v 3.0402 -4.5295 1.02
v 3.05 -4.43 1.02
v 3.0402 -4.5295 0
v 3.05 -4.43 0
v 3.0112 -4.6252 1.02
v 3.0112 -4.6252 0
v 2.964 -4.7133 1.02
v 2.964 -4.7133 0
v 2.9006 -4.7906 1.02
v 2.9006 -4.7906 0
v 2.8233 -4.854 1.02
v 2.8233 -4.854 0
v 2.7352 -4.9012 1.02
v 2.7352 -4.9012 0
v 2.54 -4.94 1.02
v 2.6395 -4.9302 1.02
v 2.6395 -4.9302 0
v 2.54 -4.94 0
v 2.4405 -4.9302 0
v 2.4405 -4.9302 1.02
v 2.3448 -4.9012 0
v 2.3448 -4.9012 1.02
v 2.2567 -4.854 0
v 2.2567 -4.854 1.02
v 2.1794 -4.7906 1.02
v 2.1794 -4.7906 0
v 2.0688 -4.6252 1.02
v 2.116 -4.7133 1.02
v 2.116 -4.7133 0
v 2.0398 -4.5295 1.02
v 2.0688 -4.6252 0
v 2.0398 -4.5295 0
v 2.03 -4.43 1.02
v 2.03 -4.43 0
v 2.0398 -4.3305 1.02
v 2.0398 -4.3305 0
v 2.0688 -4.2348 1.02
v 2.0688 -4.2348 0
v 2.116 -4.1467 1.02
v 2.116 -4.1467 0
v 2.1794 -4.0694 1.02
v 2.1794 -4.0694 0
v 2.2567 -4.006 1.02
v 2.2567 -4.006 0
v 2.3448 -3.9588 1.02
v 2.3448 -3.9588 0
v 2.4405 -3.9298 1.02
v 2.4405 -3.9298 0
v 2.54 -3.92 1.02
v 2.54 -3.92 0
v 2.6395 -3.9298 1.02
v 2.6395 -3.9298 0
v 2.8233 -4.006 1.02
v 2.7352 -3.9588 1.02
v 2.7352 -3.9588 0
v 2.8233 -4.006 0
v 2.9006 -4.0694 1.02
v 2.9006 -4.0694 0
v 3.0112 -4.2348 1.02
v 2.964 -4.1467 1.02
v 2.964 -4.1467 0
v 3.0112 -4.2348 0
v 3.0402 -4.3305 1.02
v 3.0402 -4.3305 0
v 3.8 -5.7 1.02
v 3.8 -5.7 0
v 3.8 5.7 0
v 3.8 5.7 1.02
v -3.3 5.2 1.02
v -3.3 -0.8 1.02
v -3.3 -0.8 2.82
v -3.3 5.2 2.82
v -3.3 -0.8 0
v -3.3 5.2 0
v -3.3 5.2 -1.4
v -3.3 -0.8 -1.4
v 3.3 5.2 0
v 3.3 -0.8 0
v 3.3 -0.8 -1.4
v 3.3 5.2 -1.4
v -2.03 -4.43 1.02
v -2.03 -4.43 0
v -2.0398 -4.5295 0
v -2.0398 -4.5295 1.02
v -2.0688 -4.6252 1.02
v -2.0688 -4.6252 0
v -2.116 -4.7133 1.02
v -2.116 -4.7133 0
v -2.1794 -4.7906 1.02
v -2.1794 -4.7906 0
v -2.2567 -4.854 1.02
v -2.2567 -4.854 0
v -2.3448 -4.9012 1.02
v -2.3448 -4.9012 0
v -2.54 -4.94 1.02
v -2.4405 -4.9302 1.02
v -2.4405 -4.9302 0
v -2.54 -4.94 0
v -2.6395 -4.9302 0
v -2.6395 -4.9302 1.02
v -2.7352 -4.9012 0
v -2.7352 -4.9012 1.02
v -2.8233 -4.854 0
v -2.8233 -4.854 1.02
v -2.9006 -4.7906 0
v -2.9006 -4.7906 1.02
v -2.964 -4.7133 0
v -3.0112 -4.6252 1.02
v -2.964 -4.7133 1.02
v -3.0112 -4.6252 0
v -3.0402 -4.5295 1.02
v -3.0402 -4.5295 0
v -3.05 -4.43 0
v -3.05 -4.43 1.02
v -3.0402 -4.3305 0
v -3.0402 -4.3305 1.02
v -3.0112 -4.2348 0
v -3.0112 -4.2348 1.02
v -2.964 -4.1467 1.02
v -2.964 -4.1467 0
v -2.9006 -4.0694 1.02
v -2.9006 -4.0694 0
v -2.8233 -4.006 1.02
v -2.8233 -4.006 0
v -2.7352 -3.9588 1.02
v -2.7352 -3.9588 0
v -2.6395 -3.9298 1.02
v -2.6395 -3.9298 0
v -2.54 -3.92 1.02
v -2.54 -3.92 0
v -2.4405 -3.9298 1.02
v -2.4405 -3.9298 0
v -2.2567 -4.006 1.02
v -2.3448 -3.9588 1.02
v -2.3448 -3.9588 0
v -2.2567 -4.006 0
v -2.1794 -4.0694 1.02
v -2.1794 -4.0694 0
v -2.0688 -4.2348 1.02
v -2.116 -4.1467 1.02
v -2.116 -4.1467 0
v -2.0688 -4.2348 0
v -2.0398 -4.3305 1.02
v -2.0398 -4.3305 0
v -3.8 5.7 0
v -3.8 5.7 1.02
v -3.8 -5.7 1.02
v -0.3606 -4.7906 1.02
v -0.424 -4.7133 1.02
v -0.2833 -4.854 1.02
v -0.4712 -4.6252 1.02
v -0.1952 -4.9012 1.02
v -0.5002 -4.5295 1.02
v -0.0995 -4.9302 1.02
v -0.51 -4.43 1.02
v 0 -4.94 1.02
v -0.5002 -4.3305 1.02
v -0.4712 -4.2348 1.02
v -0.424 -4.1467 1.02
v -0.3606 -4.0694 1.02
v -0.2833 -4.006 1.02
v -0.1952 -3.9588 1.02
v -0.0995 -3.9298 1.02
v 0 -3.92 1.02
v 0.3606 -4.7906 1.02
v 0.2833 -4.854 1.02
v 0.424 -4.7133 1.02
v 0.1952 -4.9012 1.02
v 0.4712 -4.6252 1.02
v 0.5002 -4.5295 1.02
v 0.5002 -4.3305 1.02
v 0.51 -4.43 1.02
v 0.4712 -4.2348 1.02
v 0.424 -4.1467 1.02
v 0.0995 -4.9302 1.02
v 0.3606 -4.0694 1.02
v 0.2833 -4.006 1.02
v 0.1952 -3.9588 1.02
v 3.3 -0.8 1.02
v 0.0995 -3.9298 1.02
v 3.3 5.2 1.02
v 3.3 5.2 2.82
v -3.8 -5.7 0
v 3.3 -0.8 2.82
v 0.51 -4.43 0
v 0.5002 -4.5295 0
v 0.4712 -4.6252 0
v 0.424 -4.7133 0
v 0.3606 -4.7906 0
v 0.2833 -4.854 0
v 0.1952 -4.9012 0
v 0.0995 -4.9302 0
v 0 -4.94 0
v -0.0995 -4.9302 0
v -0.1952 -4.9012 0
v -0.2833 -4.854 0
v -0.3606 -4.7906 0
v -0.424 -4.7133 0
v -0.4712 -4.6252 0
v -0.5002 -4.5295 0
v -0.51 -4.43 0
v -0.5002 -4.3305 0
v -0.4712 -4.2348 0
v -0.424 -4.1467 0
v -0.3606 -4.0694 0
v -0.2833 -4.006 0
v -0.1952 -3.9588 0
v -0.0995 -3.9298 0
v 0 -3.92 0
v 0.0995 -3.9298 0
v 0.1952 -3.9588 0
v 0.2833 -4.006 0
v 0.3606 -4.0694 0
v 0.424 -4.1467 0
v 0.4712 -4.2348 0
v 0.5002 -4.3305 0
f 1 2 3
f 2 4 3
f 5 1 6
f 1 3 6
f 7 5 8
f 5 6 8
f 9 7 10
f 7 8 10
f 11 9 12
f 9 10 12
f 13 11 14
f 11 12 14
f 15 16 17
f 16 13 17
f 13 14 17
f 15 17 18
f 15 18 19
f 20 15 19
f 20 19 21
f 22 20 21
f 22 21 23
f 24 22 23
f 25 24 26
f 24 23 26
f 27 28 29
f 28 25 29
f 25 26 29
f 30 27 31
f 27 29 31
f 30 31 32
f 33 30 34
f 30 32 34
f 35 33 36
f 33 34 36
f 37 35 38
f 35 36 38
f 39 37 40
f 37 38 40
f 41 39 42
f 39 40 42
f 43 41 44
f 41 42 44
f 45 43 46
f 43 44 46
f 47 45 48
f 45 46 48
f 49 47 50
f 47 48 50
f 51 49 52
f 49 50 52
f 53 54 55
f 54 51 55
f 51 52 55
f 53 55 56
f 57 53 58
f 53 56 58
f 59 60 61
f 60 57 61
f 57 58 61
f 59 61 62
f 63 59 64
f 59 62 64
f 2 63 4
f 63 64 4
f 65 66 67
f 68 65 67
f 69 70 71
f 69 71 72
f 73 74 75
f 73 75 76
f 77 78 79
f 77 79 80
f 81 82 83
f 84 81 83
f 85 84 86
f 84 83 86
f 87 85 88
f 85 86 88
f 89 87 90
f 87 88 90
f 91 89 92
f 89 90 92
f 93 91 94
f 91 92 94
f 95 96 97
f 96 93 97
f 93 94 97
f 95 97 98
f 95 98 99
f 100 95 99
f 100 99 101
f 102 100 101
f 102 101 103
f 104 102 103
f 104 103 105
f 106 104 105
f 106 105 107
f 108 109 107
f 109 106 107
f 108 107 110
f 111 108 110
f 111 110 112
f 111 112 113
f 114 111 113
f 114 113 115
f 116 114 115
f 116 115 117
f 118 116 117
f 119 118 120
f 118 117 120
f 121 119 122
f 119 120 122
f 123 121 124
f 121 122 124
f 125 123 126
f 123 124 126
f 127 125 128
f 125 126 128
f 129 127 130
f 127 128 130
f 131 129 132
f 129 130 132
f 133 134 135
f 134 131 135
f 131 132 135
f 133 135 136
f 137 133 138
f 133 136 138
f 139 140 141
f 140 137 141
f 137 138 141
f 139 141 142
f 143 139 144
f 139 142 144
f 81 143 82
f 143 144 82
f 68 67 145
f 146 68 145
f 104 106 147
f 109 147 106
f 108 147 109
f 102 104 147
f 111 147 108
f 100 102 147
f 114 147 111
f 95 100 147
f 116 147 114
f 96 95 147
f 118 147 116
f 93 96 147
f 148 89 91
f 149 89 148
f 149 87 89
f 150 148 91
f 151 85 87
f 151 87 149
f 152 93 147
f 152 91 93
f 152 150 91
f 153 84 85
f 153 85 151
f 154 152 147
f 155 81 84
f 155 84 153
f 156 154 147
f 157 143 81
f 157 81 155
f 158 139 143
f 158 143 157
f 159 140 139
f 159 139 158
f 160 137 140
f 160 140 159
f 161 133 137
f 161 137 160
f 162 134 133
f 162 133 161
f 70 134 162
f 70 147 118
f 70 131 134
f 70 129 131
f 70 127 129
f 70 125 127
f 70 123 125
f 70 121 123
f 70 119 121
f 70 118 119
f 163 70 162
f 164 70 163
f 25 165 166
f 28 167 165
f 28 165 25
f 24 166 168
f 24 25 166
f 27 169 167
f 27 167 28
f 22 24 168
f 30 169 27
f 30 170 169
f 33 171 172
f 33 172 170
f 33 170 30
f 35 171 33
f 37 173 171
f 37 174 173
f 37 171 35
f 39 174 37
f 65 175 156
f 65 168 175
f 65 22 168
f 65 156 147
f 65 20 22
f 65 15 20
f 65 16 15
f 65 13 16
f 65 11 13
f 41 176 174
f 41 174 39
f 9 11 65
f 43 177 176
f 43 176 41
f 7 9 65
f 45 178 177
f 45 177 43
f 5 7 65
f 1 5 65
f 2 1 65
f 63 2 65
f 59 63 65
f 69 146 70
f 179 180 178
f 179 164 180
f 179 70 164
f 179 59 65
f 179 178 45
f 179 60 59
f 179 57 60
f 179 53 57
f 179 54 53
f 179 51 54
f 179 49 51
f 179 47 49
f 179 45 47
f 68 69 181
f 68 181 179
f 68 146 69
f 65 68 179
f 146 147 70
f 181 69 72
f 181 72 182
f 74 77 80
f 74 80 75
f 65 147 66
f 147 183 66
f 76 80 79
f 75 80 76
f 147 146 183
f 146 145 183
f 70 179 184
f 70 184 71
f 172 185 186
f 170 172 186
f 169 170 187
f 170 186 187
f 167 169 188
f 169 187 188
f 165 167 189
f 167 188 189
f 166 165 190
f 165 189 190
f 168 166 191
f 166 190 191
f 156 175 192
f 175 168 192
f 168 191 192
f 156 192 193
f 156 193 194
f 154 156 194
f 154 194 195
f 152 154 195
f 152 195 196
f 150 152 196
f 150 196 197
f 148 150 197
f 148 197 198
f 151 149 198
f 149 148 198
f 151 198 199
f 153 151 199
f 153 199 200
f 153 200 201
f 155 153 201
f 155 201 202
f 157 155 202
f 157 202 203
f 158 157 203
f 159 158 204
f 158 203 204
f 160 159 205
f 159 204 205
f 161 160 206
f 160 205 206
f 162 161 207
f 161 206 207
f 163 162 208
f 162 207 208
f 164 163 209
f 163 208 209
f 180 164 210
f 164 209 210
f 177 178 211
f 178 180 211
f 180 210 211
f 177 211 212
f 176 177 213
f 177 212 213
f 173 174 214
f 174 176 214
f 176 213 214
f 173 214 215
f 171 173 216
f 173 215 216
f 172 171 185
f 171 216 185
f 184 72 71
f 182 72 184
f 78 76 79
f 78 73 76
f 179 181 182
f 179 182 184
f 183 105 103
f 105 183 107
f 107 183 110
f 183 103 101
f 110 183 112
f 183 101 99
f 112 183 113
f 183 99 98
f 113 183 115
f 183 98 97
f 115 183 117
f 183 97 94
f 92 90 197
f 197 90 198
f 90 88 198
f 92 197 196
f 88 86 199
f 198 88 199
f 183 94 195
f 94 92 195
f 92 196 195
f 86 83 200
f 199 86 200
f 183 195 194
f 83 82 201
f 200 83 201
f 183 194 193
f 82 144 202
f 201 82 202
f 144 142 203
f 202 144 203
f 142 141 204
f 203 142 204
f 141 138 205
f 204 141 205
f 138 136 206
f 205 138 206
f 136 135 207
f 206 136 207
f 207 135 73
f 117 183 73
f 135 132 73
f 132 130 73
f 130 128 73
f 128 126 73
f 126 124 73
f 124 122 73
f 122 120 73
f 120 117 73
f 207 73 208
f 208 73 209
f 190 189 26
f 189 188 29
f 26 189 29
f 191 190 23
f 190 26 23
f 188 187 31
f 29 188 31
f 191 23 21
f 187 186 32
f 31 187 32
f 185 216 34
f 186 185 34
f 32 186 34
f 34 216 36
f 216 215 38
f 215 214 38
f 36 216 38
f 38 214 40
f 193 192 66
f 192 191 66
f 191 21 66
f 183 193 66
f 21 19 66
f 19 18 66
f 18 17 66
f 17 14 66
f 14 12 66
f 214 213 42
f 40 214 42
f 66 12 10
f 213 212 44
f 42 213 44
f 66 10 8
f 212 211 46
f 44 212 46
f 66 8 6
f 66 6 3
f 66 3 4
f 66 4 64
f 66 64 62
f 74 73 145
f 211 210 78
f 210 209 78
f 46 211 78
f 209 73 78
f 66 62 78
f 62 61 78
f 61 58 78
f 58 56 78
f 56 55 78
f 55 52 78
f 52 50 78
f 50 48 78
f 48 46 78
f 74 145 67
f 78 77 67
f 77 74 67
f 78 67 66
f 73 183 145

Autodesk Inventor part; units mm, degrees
ref_plane "YZ Plane" through (0, 0, 0) normal (1, 0, 0) x (0, 1, 0)
ref_plane "XZ Plane" through (0, 0, 0) normal (0, 1, 0) x (-1, 0, 0)
ref_plane "XY Plane" through (0, 0, 0) normal (0, 0, 1) x (1, 0, 0)
sketch "スケッチ1" plane through (0, 0, 0) normal (0, 0, 1) x (1, 0, 0)
  line L0 (-3.8, -5.7) -> (3.8, -5.7)
  line L1 (3.8, -5.7) -> (3.8, 5.7)
  line L2 (3.8, 5.7) -> (-3.8, 5.7)
  line L3 (-3.8, 5.7) -> (-3.8, -5.7)
  line L4 (-3.8, -5.7) -> (3.8, 5.7) construction
  line L5 (3.8, -5.7) -> (-3.8, 5.7) construction
  circle A0 centre (0, -4.43) radius 0.51
  circle A1 centre (-2.54, -4.43) radius 0.51
  circle A2 centre (2.54, -4.43) radius 0.51
  point P0 (0, 0)
  point P1 (0, 0)
  dimension "d0" = 11.4
  dimension "d1" = 7.6
  dimension "d2" = 1.27
  dimension "d3" = 2.54
  dimension "d4" = 2.54
  dimension "d5" = 1.02
extrude "押し出し1" add sketch "スケッチ1" along normal blind 1.02
sketch "スケッチ2" plane through (0, 0, 1.02) normal (0, 0, 1) x (1, 0, 0)
  line L0 (-3.3, 5.2) -> (3.3, 5.2)
  line L1 (3.3, 5.2) -> (3.3, -0.8)
  line L2 (3.3, -0.8) -> (-3.3, -0.8)
  line L3 (-3.3, -0.8) -> (-3.3, 5.2)
  line L4 (-3.3, 5.2) -> (3.3, -0.8) construction
  line L5 (3.3, 5.2) -> (-3.3, -0.8) construction
  line L6 (3.8, 5.7) -> (-3.8, 5.7) projected
  line L7 (-3.8, 5.7) -> (-3.8, -5.7) projected
  line L8 (3.8, -5.7) -> (3.8, 5.7) projected
  point P0 (0, 0)
  point P1 (0, 2.2)
  dimension "d8" = 0.5
  dimension "d9" = 0.5
  dimension "d10" = 0.5
  dimension "d11" = 6
extrude "押し出し2" add sketch "スケッチ2" along normal blind 1.8
sketch "スケッチ3" plane through (0, 0, 0) normal (0, 0, -1) x (-1, 0, 0)
  line L0 (-3.3, 5.2) -> (3.3, 5.2) projected
  line L1 (3.3, 5.2) -> (3.3, -0.8) projected
  line L2 (3.3, -0.8) -> (-3.3, -0.8) projected
  line L3 (-3.3, -0.8) -> (-3.3, 5.2) projected
  point P0 (0, 0)
extrude "押し出し3" add sketch "スケッチ3" along normal blind 1.4
sketch "スケッチ4" plane through (0, 0, 1.02) normal (0, 0, 1) x (1, 0, 0)
  line L0 (-3.0991, -3.2712) -> (-1.8939, -3.2712) construction
  line L1 (-1.8939, -3.2712) -> (-1.8939, -3.8169) construction
  line L2 (-1.8939, -3.8169) -> (-3.0991, -3.8169) construction
  line L3 (-3.0991, -3.8169) -> (-3.0991, -3.2712) construction
  line L4 (-0.6641, -3.2466) -> (0.9346, -3.2466) construction
  line L5 (0.9346, -3.2466) -> (0.9346, -3.8169) construction
  line L6 (0.9346, -3.8169) -> (-0.6641, -3.8169) construction
  line L7 (-0.6641, -3.8169) -> (-0.6641, -3.2466) construction
  line L8 (1.7955, -3.2958) -> (3.5455, -3.2958) construction
  line L9 (3.5455, -3.2958) -> (3.5455, -3.8169) construction
  line L10 (3.5455, -3.8169) -> (1.7955, -3.8169) construction
  line L11 (1.7955, -3.8169) -> (1.7955, -3.2958) construction
  point P0 (0, 0)
properties part number "S7V7F5"
